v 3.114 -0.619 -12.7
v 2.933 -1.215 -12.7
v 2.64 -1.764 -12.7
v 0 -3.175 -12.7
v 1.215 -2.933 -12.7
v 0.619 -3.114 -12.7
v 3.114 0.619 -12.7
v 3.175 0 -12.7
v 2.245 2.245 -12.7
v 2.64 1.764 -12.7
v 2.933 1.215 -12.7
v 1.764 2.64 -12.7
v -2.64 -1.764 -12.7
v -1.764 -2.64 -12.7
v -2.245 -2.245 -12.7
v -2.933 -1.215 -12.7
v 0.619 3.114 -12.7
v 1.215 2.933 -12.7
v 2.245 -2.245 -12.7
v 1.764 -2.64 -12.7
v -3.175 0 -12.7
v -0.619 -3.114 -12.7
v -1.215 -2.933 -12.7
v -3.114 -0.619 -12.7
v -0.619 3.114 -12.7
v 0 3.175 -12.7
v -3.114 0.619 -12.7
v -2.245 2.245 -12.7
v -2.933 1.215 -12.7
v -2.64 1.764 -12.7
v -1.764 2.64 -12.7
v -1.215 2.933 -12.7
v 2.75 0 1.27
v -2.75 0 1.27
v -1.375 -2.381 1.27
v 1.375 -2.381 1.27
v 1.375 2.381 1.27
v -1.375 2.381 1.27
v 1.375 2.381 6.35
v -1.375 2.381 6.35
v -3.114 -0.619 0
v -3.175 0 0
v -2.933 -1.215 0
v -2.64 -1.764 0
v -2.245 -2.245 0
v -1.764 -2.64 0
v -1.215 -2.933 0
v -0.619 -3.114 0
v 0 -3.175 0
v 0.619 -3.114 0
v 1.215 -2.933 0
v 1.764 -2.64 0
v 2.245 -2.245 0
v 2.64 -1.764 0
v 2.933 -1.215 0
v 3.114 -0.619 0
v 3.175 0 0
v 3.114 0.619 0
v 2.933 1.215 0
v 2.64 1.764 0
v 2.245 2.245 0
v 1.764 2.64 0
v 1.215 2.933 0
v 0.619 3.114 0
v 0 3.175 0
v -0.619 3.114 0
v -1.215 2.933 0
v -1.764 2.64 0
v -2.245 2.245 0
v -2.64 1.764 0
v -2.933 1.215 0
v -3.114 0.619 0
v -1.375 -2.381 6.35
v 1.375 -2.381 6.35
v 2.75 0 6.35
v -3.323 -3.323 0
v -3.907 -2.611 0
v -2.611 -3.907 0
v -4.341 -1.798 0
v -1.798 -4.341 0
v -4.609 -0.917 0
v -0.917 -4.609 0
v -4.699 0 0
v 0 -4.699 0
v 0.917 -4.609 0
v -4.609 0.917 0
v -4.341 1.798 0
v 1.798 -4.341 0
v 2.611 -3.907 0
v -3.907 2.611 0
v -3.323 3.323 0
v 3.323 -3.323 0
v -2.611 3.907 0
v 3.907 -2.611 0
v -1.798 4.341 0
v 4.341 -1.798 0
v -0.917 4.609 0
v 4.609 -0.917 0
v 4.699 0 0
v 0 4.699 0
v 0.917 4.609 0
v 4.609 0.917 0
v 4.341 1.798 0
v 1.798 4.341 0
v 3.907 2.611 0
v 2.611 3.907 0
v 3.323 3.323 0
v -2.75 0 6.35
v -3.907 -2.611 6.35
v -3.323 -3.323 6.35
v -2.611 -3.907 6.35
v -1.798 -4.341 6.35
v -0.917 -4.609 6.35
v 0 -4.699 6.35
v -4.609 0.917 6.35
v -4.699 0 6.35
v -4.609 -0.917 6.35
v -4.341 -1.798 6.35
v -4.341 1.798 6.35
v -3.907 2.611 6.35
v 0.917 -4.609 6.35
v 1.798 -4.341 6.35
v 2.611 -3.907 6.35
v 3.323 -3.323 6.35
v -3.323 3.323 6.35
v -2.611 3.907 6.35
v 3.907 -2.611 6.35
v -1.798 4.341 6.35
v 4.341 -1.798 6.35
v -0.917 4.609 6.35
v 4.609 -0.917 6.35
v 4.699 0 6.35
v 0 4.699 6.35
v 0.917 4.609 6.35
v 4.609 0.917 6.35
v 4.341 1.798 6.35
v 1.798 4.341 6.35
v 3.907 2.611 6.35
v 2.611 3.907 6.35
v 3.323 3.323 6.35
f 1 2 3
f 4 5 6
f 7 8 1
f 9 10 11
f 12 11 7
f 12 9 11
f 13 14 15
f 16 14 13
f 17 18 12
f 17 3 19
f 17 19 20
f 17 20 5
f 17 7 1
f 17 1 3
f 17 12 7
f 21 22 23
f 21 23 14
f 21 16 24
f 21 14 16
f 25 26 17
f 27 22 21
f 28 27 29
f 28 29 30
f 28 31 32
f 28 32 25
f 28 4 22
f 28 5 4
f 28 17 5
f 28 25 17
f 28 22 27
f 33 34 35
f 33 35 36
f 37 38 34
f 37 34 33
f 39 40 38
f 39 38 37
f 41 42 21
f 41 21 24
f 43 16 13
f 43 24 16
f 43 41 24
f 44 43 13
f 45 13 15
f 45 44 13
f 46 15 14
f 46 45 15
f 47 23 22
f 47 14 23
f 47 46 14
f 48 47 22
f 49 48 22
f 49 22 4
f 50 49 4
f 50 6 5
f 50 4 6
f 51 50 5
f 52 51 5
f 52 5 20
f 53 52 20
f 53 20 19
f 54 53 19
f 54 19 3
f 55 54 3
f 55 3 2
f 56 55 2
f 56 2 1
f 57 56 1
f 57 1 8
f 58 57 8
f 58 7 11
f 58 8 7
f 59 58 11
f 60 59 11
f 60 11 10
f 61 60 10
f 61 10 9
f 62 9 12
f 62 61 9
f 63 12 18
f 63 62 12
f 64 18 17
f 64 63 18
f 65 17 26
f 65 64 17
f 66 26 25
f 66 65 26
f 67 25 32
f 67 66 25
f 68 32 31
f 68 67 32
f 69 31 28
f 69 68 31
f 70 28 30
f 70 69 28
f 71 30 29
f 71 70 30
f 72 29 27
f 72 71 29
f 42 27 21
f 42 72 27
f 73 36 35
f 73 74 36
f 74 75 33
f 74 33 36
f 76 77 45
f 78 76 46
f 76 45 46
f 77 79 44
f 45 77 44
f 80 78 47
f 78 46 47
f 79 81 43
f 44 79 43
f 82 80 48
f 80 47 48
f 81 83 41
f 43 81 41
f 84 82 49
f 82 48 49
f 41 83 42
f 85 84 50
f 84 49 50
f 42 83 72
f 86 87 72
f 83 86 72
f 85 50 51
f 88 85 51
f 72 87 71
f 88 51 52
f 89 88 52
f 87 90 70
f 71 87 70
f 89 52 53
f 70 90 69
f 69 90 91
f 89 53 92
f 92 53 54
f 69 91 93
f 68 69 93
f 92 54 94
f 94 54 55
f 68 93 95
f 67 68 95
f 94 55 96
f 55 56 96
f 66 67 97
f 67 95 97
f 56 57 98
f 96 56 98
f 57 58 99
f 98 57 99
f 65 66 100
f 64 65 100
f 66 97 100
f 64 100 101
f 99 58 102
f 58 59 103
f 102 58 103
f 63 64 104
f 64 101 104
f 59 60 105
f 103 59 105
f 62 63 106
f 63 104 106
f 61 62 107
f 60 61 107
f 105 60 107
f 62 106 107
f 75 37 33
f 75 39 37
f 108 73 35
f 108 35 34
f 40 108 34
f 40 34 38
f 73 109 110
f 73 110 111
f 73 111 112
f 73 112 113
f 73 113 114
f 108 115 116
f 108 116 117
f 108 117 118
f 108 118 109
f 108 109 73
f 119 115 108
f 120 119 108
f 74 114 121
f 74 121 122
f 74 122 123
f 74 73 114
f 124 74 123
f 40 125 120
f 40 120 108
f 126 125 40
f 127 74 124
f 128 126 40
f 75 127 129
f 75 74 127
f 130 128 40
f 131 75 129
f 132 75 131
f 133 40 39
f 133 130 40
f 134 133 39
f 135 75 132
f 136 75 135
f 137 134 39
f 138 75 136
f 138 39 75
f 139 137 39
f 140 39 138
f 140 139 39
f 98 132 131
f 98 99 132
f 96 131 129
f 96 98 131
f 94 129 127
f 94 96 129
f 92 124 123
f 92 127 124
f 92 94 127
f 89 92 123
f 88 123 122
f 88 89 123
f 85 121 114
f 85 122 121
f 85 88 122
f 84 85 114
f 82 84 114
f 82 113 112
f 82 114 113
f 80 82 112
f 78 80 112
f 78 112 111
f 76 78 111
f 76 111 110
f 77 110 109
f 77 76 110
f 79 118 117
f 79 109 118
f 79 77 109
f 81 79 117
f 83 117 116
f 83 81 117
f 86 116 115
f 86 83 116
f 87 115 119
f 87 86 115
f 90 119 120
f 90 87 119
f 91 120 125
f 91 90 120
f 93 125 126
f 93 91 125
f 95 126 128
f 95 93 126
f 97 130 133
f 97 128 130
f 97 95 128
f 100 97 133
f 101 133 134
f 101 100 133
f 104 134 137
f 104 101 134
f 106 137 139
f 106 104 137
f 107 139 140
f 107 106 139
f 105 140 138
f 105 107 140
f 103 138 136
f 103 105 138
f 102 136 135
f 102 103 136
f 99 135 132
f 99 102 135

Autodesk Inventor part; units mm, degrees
ref_plane "YZ Plane" through (0, 0, 0) normal (1, 0, 0) x (0, 1, 0)
ref_plane "XZ Plane" through (0, 0, 0) normal (0, 1, 0) x (-1, 0, 0)
ref_plane "XY Plane" through (0, 0, 0) normal (0, 0, 1) x (1, 0, 0)
sketch "Sketch1" plane through (0, 0, 0) normal (0, 0, 1) x (1, 0, 0)
  circle A0 centre (0, 0) radius 4.699
  dimension "d0" = 9.398
extrude "Extrusion1" add sketch "Sketch1" along normal blind 6.35
sketch "Sketch2" plane through (0, 0, 0) normal (0, 0, -1) x (-1, 0, 0)
  circle A0 centre (0, 0) radius 4.699 projected
  circle A1 centre (0, 0) radius 3.175
  dimension "d3" = 6.35
extrude "Extrusion2" add sketch "Sketch2" along normal blind 12.7 contours A1
thread "Thread1" size "1/4-20 UNC" class "2A" standard "ANSI Unified Screw Threads" full length
sketch "Sketch3" plane through (0, 0, 6.35) normal (0, 0, 1) x (1, 0, 0)
  circle A0 centre (0, 0) radius 4.699 projected
  line L0 (2.7496, 0) -> (1.3748, -2.3813)
  line L1 (1.3748, -2.3813) -> (-1.3748, -2.3813)
  line L2 (-1.3748, -2.3813) -> (-2.7496, 0)
  line L3 (-2.7496, 0) -> (-1.3748, 2.3812)
  line L4 (-1.3748, 2.3812) -> (1.3748, 2.3812)
  line L5 (1.3748, 2.3812) -> (2.7496, 0)
  dimension "d11" = 4.7625
extrude "Extrusion3" cut sketch "Sketch3" against normal blind 5.08 contours L0 L1 L2 L3 L4 L5
properties part number "SHCS bolt"
